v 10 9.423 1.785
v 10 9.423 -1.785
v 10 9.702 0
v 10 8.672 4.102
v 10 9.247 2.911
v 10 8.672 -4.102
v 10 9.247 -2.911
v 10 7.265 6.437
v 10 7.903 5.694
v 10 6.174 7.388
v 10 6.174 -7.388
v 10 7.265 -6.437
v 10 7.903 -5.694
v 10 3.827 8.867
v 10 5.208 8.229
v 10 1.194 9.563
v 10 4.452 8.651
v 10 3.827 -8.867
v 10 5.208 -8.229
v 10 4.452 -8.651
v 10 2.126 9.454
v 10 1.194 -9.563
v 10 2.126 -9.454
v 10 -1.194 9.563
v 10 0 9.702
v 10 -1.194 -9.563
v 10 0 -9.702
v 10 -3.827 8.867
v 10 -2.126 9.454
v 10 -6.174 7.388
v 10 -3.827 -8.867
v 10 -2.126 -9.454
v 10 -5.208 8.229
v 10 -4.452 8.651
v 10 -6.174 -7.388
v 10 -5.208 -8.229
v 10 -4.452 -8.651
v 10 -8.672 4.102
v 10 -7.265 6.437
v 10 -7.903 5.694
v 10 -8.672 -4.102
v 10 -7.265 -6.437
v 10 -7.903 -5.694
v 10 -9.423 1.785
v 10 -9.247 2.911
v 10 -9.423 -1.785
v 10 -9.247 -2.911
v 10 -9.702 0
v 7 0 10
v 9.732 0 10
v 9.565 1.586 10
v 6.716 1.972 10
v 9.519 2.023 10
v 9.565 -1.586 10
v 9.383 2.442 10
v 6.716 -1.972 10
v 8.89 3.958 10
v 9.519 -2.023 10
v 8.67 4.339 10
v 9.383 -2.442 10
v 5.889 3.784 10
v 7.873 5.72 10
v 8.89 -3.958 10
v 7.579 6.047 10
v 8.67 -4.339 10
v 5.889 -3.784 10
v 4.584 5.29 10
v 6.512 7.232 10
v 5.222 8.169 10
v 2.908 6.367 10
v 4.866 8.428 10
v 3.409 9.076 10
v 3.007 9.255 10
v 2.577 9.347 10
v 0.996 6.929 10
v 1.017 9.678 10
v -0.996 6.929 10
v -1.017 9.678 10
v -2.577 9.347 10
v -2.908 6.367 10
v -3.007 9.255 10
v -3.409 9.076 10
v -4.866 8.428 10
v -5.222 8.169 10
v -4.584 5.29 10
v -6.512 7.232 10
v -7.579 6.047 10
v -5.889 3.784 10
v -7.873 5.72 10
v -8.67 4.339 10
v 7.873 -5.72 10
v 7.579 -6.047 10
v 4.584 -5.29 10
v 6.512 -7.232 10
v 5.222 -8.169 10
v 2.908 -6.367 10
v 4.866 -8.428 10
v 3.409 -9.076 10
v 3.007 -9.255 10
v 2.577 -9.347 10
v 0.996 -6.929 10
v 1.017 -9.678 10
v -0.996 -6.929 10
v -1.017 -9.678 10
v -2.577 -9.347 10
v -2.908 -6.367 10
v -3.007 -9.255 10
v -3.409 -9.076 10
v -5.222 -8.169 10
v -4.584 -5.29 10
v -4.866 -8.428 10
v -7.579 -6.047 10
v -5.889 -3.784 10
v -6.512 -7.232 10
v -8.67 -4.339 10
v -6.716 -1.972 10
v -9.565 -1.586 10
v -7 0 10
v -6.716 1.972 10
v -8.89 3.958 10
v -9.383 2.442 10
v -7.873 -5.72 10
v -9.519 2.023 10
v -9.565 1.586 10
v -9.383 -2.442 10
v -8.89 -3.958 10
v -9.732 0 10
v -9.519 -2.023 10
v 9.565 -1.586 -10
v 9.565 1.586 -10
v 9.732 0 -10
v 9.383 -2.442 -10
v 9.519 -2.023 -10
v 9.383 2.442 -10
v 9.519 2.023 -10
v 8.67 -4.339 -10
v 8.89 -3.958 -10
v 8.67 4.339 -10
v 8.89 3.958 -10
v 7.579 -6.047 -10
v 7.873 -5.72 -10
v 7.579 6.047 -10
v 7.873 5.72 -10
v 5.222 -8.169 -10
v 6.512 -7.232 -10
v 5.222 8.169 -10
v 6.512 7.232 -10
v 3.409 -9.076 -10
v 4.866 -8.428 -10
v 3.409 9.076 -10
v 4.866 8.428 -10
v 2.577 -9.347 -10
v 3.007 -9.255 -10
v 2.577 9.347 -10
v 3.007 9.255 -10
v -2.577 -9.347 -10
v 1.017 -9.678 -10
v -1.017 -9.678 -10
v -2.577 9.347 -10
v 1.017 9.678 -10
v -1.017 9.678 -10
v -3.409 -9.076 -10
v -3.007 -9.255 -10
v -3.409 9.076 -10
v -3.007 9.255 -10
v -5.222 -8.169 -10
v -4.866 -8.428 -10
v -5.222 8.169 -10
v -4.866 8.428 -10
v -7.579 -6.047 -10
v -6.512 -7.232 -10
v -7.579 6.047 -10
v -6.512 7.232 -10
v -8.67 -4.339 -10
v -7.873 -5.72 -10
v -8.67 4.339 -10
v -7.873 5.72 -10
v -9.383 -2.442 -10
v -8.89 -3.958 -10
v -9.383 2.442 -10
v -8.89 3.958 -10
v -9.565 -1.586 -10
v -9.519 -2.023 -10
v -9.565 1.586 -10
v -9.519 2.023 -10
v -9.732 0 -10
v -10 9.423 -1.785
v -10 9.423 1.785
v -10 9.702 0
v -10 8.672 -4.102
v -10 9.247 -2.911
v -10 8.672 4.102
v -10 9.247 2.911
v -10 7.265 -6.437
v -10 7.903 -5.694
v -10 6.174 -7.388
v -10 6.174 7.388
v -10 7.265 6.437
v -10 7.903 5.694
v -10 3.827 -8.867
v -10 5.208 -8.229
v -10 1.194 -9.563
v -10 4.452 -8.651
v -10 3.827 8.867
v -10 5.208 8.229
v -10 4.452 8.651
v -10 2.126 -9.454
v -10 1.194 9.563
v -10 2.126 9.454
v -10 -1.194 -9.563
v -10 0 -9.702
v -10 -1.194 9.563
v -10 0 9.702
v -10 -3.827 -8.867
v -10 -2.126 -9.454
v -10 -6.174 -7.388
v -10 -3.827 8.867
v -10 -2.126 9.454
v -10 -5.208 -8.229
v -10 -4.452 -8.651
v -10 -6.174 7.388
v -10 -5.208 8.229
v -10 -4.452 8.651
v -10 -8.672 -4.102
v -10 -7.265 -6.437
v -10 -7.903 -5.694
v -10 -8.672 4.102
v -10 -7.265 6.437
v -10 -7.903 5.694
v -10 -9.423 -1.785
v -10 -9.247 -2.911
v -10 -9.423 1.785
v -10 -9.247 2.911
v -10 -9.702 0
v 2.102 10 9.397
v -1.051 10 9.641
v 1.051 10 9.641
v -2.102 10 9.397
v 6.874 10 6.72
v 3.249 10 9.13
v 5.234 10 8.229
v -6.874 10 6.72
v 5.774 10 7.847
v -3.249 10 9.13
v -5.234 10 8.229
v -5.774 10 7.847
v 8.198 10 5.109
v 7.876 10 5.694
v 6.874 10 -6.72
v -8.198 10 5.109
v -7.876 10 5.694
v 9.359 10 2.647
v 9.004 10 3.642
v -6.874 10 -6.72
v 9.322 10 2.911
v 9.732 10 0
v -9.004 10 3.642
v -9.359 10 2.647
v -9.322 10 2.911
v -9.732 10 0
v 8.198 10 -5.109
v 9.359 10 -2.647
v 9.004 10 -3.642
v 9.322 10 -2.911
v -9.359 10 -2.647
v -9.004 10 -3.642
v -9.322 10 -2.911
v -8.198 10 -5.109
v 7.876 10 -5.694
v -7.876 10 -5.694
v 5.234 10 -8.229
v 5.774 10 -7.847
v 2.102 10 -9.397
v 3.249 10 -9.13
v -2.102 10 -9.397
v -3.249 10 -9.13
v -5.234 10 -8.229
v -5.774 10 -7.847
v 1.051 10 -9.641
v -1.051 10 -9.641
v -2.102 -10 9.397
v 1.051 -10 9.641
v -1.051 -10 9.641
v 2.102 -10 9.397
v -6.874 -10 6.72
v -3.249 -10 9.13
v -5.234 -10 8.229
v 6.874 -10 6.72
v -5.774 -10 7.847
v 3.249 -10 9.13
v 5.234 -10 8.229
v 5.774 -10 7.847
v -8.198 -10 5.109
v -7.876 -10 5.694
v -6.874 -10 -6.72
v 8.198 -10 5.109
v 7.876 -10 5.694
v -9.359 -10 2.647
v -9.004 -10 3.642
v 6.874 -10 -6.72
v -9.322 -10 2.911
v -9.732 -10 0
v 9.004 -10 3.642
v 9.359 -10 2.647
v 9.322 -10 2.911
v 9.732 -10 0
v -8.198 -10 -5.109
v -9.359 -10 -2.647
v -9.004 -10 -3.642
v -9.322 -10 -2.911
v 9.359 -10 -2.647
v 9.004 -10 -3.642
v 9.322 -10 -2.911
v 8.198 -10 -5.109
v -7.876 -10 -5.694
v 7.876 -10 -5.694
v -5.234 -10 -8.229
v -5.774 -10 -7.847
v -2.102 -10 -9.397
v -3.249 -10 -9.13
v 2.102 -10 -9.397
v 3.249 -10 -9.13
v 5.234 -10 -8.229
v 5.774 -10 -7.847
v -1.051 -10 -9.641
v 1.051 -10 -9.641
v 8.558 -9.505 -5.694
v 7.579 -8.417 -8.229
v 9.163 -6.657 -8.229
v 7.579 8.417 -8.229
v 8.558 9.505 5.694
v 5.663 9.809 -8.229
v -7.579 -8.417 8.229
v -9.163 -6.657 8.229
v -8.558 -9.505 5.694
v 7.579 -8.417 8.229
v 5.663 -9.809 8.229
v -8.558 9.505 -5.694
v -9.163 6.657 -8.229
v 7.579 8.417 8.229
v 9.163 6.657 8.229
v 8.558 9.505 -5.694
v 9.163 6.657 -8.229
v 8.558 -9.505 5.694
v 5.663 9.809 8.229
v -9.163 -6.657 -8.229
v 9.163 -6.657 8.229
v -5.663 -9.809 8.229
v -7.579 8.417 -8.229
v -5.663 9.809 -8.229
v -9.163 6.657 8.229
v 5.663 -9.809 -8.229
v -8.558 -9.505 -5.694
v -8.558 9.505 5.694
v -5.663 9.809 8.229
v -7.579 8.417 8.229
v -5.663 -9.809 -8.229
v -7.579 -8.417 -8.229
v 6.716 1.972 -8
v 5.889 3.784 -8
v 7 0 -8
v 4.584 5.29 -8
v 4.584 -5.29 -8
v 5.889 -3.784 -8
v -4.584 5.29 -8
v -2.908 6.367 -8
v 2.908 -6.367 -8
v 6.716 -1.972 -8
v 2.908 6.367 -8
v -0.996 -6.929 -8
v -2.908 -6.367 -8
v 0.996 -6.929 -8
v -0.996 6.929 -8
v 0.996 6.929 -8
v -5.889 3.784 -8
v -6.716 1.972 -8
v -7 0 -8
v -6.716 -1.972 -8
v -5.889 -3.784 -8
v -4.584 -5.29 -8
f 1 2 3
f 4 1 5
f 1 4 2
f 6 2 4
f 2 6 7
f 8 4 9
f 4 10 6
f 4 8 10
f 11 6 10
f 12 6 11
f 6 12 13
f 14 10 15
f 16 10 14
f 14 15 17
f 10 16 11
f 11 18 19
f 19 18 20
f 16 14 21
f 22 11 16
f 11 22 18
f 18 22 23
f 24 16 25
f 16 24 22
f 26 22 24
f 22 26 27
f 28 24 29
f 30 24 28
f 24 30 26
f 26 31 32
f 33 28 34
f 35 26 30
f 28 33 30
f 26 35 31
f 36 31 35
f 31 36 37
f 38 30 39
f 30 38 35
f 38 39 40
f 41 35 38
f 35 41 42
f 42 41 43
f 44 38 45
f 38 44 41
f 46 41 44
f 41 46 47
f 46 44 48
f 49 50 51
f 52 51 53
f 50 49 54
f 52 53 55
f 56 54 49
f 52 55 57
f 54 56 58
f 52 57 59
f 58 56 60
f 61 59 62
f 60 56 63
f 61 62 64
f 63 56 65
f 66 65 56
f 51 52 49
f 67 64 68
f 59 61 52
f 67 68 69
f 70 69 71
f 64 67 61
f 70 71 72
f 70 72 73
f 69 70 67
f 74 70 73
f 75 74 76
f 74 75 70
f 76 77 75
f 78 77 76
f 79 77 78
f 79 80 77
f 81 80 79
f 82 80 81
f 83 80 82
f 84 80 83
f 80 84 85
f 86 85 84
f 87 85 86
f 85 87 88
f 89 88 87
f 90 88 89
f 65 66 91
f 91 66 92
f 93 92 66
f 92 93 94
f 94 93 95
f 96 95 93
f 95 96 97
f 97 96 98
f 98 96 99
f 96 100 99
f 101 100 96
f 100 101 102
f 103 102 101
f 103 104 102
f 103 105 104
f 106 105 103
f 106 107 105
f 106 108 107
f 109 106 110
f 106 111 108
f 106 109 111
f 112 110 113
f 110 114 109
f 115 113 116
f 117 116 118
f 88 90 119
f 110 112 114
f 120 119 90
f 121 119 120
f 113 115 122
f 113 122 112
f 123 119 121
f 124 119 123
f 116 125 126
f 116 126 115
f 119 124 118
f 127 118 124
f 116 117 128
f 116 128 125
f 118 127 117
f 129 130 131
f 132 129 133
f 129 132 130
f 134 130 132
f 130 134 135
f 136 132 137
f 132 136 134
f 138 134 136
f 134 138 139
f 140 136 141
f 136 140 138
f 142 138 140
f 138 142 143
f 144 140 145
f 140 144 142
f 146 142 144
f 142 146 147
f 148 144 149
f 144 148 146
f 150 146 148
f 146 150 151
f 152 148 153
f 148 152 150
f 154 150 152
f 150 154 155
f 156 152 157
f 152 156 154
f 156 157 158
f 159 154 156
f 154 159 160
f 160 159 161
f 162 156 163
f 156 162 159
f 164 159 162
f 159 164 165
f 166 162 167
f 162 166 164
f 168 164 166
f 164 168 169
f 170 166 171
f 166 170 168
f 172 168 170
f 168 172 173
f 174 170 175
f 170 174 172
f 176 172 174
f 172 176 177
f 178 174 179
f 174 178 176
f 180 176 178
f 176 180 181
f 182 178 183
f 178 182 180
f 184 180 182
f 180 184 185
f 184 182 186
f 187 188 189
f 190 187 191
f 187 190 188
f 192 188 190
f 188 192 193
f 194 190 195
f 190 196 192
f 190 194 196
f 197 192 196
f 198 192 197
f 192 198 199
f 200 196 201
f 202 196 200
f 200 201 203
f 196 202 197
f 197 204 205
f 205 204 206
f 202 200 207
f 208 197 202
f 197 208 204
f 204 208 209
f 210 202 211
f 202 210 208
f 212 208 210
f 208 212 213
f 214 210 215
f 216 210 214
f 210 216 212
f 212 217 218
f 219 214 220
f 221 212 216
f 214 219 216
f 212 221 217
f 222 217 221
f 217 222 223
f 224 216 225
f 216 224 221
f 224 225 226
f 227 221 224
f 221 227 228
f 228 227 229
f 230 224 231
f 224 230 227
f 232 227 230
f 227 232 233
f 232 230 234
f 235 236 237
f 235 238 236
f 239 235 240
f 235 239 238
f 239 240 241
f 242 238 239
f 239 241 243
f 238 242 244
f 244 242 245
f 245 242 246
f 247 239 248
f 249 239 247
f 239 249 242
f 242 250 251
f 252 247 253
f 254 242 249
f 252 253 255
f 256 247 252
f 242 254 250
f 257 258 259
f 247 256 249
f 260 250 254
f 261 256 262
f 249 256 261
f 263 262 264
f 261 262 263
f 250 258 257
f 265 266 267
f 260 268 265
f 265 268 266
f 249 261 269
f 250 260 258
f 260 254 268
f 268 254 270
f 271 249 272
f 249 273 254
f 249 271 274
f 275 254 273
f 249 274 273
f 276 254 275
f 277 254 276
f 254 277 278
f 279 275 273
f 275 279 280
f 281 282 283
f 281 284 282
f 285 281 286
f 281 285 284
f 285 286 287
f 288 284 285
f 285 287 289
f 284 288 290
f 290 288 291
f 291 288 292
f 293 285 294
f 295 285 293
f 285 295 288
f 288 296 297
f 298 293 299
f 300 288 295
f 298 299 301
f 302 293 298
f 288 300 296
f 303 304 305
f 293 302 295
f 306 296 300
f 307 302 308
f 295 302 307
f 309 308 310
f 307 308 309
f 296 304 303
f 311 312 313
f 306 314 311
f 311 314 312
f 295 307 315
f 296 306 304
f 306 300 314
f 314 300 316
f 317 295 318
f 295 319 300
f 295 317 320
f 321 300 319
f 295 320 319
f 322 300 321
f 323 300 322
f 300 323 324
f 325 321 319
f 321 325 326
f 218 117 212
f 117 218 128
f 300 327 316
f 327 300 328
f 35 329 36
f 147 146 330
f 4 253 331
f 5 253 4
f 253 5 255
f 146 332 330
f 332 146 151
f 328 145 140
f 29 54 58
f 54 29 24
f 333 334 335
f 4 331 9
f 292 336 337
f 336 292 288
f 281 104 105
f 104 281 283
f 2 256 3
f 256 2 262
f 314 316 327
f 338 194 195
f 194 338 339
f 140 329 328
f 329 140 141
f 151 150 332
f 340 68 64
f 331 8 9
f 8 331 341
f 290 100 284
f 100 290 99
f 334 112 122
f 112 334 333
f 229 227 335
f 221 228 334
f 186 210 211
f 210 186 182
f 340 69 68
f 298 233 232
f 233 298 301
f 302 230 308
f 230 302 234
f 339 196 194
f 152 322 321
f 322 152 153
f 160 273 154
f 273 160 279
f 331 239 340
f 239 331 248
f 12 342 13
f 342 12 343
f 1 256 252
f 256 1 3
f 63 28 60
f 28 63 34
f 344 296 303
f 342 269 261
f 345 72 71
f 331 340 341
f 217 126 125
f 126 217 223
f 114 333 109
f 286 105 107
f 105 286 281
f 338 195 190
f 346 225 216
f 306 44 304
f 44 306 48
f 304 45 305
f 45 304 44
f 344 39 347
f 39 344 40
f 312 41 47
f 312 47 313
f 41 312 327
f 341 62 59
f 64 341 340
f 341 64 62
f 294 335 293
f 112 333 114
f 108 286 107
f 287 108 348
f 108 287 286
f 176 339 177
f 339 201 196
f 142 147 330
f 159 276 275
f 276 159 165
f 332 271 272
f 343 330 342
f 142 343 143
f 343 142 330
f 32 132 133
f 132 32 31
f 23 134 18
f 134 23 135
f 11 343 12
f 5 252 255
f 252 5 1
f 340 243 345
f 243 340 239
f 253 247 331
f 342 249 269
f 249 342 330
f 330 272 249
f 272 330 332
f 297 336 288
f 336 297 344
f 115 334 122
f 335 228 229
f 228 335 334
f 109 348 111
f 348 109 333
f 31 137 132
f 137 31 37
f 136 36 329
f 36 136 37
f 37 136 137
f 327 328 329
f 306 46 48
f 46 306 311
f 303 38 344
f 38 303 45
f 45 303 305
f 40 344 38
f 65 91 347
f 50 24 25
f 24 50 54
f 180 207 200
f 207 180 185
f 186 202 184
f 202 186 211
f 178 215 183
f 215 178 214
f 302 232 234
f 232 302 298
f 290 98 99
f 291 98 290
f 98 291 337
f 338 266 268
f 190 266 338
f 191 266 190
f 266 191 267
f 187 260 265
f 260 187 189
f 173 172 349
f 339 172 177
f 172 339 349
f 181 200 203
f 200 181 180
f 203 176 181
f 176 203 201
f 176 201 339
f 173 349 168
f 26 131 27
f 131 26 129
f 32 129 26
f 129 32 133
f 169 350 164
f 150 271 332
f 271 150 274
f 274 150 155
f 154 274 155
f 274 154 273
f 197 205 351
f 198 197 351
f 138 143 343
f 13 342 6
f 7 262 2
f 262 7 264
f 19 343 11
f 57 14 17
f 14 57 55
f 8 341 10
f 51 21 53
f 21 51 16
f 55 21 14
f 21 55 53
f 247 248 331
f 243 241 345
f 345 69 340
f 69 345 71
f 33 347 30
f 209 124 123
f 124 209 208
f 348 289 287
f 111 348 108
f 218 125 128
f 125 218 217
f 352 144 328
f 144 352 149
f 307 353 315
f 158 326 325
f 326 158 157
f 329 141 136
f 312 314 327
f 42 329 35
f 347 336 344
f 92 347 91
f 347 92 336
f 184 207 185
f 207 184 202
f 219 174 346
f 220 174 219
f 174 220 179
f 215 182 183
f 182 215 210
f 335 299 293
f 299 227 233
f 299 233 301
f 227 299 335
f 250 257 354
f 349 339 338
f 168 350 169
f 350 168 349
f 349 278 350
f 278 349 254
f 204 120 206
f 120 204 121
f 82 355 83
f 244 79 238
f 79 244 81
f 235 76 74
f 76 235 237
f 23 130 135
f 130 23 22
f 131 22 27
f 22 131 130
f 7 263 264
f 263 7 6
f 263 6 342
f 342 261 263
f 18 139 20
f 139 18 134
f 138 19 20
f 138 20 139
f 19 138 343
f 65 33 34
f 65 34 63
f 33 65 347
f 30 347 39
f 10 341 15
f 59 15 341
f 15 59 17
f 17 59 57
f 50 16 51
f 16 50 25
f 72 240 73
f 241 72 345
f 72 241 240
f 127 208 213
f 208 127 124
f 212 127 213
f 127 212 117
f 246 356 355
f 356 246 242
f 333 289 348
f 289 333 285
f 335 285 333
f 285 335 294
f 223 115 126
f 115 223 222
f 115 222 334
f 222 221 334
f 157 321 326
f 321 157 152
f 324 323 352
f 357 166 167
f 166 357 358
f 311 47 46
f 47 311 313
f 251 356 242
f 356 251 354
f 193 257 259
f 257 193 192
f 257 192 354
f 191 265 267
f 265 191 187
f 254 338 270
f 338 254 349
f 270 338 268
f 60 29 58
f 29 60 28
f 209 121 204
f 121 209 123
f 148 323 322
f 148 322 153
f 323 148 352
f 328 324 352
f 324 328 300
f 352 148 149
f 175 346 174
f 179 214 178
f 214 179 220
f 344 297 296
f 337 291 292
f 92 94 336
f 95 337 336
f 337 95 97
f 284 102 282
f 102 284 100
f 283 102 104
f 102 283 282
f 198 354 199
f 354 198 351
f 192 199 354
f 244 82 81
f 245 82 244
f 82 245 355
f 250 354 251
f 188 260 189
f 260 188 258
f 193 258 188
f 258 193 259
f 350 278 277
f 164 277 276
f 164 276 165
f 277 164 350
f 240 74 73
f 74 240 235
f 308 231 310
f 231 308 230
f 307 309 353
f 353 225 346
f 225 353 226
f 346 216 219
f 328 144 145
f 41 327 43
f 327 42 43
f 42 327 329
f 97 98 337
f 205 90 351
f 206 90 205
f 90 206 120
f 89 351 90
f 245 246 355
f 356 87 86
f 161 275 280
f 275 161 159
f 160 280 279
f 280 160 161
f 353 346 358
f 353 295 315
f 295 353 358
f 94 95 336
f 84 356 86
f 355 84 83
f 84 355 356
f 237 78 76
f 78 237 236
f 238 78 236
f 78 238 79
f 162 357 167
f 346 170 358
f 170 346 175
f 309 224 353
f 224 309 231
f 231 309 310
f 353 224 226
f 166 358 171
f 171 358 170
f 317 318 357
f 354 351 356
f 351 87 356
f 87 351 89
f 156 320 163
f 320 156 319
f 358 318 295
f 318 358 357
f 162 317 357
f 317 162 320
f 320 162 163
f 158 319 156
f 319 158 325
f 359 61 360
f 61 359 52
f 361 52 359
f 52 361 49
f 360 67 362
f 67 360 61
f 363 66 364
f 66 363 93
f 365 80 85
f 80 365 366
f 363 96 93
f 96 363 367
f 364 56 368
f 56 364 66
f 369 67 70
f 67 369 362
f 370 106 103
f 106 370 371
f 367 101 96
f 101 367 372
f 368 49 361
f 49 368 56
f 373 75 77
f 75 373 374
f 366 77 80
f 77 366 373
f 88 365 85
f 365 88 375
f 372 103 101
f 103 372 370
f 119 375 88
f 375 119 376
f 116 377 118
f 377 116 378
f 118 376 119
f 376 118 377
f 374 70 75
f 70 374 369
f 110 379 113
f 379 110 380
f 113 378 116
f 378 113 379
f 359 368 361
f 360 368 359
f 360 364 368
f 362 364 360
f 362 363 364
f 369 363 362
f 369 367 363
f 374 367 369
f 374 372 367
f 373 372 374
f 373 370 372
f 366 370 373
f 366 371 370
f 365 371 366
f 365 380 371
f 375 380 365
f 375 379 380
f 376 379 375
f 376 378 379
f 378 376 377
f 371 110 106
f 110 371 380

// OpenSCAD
    
difference()
{
intersection()
{
    cube(size=[20, 20, 20], center=true);
    sphere(r=14);
}
translate([0,0,-8])
    cylinder(r=7, h=22);
}
